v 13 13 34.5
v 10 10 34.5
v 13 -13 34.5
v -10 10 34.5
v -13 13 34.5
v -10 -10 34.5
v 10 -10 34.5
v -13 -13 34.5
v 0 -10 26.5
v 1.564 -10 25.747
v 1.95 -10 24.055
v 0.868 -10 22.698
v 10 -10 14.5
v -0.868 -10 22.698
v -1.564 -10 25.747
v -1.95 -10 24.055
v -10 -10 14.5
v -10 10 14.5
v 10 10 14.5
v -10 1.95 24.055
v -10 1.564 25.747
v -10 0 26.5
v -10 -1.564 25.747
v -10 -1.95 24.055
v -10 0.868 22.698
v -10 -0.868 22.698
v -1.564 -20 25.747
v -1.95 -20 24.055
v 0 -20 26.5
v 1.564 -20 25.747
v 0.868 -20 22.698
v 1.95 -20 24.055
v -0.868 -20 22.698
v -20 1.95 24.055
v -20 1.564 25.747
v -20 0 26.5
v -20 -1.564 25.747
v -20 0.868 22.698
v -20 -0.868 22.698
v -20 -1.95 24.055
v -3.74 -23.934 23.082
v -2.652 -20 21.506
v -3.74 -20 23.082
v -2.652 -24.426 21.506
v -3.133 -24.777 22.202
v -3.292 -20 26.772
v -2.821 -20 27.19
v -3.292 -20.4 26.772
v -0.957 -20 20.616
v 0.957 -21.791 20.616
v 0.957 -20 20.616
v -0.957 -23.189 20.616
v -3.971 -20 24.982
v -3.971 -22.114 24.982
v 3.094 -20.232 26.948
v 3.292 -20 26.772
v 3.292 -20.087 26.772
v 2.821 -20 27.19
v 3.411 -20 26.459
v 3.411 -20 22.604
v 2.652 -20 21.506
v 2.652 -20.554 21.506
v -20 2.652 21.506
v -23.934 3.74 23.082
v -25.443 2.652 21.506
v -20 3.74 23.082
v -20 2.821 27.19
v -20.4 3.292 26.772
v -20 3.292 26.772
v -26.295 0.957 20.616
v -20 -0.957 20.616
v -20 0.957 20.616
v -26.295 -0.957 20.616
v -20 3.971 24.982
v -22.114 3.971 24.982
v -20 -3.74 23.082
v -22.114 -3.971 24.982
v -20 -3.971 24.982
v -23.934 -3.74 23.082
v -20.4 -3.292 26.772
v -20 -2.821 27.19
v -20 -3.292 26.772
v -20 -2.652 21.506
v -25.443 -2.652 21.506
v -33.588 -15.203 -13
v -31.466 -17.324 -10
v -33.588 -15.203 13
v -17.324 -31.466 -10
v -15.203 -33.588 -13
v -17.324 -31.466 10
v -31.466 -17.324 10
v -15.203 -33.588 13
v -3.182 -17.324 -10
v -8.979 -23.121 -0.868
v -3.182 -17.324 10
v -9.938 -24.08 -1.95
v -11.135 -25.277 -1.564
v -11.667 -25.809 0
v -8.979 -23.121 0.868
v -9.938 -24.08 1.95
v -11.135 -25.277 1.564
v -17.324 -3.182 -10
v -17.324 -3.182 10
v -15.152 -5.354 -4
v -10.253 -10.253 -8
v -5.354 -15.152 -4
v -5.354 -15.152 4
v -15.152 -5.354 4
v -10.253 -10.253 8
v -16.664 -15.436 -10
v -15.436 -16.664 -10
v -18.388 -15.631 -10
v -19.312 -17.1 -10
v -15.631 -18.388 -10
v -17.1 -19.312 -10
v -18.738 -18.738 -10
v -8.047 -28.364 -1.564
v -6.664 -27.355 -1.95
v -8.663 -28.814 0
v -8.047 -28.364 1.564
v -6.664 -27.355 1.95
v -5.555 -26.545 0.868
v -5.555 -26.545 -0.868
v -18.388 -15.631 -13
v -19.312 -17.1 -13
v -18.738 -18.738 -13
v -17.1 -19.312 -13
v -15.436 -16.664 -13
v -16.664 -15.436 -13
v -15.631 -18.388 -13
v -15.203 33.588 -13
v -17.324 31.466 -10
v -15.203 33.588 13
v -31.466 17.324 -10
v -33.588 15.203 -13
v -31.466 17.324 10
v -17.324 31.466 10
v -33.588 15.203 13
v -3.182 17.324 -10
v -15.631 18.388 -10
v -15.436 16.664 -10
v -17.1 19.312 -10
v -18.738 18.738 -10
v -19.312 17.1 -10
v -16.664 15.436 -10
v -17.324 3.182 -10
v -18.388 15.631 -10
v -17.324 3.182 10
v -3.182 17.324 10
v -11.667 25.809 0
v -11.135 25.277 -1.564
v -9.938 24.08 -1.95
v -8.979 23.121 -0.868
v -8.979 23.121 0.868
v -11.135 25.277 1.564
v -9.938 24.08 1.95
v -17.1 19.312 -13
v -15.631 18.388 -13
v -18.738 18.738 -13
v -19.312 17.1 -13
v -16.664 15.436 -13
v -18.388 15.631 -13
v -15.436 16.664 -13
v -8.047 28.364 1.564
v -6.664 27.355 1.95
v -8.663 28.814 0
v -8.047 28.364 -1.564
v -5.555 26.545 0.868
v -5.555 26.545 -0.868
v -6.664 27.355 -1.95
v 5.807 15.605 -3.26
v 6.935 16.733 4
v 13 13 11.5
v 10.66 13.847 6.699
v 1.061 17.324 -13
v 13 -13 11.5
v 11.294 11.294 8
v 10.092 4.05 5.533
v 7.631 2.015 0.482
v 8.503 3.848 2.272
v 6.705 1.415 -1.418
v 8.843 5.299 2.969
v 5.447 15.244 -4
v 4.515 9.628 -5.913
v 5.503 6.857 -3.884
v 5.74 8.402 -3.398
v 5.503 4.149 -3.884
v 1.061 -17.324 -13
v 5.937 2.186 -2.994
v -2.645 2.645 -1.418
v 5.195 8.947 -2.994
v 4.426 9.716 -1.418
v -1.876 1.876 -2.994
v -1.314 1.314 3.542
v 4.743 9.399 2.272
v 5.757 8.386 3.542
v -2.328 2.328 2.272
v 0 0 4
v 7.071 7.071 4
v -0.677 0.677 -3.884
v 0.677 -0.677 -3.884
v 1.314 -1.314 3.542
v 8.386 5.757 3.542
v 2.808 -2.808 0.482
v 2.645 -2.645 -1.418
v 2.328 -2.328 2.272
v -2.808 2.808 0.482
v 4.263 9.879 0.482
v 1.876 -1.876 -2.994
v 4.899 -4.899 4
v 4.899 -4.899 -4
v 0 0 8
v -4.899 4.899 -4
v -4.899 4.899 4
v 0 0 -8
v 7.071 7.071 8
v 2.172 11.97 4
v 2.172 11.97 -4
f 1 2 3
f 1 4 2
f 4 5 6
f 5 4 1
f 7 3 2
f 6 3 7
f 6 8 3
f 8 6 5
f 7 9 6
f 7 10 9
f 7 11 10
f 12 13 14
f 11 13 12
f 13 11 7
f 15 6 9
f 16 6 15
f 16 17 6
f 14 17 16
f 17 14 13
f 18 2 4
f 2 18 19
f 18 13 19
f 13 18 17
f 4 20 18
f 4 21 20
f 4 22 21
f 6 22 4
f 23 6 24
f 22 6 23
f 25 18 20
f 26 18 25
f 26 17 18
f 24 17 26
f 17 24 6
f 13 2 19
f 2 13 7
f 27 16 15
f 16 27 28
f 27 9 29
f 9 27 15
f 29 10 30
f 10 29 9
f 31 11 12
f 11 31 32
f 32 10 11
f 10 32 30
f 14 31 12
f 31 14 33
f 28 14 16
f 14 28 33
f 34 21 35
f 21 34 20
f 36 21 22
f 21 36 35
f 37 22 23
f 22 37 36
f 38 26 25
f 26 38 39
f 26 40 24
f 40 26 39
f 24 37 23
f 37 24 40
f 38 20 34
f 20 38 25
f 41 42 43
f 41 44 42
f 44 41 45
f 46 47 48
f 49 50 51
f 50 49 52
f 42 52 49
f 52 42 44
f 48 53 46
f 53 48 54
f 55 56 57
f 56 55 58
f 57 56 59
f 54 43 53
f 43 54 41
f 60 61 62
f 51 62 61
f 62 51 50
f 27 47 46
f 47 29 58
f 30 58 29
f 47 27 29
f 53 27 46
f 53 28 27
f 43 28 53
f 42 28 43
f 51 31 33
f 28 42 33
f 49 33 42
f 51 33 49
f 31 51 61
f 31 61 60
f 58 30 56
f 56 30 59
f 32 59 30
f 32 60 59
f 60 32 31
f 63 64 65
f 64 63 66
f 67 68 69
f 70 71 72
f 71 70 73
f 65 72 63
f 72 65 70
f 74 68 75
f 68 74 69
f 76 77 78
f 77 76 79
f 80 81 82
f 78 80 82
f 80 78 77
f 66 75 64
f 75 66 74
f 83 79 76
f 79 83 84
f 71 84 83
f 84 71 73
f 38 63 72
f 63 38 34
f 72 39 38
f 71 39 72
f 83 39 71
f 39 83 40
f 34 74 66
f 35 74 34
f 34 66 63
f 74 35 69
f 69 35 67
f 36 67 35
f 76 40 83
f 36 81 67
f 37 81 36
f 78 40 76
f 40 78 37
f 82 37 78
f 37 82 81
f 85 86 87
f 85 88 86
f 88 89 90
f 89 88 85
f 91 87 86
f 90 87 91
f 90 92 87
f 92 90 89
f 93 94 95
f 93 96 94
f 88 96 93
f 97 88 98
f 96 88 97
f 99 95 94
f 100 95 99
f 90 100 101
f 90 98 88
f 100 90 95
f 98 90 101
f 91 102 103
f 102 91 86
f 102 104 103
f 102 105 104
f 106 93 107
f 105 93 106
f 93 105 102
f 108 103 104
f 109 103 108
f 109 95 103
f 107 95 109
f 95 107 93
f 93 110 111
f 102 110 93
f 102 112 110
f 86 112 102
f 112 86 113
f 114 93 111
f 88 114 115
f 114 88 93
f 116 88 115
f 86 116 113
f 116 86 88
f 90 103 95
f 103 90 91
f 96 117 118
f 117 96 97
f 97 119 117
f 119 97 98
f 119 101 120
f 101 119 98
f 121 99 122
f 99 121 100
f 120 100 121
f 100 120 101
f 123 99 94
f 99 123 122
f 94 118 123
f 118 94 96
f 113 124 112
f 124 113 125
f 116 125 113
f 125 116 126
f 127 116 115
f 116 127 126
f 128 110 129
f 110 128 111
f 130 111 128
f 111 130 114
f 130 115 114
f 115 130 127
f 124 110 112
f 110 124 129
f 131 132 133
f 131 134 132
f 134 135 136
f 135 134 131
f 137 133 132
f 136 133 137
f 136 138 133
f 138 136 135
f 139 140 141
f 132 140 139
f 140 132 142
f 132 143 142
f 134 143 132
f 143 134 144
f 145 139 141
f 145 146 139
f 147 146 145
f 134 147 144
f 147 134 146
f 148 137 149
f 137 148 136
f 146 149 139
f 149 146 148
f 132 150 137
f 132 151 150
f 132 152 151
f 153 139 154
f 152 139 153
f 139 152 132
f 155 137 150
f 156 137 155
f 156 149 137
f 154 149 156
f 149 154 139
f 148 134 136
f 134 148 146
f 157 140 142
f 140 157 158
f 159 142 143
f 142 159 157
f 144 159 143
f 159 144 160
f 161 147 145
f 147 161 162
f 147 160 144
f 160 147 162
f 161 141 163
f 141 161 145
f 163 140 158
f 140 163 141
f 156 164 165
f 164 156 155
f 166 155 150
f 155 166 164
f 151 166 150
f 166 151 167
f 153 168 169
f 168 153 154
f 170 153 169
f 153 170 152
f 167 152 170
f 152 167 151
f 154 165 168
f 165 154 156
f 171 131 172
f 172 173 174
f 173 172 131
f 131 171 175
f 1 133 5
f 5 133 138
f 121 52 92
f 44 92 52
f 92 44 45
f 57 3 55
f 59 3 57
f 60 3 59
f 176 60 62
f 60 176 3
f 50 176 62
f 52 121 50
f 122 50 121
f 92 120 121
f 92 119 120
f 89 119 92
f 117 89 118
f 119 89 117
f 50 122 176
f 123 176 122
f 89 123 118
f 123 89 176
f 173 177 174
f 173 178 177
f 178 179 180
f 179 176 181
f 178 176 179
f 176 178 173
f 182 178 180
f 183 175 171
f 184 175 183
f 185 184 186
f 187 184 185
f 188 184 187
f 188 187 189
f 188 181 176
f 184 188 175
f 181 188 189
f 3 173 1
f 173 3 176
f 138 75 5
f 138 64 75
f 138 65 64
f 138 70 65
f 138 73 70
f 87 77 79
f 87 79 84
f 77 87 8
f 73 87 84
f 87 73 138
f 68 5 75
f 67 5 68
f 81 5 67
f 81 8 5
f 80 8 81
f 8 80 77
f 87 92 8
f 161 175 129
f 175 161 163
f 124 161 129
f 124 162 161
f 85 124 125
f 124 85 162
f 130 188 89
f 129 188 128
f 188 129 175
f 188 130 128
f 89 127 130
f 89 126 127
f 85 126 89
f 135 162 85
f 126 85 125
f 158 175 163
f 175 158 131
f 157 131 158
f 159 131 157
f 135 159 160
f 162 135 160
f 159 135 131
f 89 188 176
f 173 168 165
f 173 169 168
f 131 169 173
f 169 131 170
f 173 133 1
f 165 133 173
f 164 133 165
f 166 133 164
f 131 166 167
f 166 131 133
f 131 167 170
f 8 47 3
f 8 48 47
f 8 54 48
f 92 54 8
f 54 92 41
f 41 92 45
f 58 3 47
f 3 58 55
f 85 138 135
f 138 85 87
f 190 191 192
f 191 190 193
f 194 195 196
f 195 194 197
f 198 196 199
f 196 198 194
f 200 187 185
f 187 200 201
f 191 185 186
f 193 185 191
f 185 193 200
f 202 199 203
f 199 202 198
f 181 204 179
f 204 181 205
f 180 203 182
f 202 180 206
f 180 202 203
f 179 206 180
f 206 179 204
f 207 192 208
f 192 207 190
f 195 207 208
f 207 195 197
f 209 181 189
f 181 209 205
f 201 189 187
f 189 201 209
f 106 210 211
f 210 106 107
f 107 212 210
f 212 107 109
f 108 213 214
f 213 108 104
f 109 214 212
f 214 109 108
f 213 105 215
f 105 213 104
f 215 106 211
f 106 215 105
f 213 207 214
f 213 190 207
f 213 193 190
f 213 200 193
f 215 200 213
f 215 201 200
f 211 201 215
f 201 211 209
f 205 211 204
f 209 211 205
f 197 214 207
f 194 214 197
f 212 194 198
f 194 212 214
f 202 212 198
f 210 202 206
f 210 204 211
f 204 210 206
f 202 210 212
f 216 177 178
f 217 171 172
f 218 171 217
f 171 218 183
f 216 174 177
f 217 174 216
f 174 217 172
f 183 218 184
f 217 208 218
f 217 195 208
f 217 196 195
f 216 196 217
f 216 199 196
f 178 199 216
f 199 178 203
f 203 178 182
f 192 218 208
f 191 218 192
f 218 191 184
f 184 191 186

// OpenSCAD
// file: veriables.scad
aluminum_width			= 20;
wall_thickness			= 3;
depth						= 20;
smooth_rod				= 10;
long_bearing_od			= 19;
long_bearing_length		= 29;
bearing_outer			= 22;
bearing_inner			= 8;
bearing_thick				= 7;
screw_diamiter			= 4;
motor_width				= 42.5;
motor_screw_space		= 31;

hotend_gap				= 6;
hotend_gap_dia			= 12;
hotend_top				= 3;
hotend_top_dia			= 16;

x_rod_spacing			= 60;

aluminum_plate_thick	= 3;
// main file
include <veriables.scad>;

module block(){
	translate([depth+wall_thickness,0,0]) cube([depth+wall_thickness,aluminum_width+(wall_thickness*2),aluminum_width+(wall_thickness*2)], center=true);
}

module taken(){
	module something(){
		cube([depth,aluminum_width,aluminum_width], center=true);
		cylinder(h=30, d=4);
		rotate([-90,0,0]) cylinder(h=30, d=4);
		translate([0,0,aluminum_width])  cylinder(h=30, d=8);
		rotate([-90,0,0]) translate([0,0,aluminum_width]) cylinder(h=30, d=8);
	}
	translate([wall_thickness/2+depth+wall_thickness,0,0]) something();
}

rotate([45,-90,0]) difference(){
hull(){
	rotate([45,0,0]) block();
	rotate([0,-90,0]) block();
	rotate([0,0,90]) block();
}
rotate([45,0,0]) taken();
rotate([90,-90,0]) taken();
rotate([-90,0,90]) taken();
cylinder(d=8, h=50, center=true);
translate([0,0,10]) cylinder(d=16, h=20, center=true, $fn=6);
translate([0,0,-20]) #cylinder(d=16, h=20, center=true, $fn=6);
}
